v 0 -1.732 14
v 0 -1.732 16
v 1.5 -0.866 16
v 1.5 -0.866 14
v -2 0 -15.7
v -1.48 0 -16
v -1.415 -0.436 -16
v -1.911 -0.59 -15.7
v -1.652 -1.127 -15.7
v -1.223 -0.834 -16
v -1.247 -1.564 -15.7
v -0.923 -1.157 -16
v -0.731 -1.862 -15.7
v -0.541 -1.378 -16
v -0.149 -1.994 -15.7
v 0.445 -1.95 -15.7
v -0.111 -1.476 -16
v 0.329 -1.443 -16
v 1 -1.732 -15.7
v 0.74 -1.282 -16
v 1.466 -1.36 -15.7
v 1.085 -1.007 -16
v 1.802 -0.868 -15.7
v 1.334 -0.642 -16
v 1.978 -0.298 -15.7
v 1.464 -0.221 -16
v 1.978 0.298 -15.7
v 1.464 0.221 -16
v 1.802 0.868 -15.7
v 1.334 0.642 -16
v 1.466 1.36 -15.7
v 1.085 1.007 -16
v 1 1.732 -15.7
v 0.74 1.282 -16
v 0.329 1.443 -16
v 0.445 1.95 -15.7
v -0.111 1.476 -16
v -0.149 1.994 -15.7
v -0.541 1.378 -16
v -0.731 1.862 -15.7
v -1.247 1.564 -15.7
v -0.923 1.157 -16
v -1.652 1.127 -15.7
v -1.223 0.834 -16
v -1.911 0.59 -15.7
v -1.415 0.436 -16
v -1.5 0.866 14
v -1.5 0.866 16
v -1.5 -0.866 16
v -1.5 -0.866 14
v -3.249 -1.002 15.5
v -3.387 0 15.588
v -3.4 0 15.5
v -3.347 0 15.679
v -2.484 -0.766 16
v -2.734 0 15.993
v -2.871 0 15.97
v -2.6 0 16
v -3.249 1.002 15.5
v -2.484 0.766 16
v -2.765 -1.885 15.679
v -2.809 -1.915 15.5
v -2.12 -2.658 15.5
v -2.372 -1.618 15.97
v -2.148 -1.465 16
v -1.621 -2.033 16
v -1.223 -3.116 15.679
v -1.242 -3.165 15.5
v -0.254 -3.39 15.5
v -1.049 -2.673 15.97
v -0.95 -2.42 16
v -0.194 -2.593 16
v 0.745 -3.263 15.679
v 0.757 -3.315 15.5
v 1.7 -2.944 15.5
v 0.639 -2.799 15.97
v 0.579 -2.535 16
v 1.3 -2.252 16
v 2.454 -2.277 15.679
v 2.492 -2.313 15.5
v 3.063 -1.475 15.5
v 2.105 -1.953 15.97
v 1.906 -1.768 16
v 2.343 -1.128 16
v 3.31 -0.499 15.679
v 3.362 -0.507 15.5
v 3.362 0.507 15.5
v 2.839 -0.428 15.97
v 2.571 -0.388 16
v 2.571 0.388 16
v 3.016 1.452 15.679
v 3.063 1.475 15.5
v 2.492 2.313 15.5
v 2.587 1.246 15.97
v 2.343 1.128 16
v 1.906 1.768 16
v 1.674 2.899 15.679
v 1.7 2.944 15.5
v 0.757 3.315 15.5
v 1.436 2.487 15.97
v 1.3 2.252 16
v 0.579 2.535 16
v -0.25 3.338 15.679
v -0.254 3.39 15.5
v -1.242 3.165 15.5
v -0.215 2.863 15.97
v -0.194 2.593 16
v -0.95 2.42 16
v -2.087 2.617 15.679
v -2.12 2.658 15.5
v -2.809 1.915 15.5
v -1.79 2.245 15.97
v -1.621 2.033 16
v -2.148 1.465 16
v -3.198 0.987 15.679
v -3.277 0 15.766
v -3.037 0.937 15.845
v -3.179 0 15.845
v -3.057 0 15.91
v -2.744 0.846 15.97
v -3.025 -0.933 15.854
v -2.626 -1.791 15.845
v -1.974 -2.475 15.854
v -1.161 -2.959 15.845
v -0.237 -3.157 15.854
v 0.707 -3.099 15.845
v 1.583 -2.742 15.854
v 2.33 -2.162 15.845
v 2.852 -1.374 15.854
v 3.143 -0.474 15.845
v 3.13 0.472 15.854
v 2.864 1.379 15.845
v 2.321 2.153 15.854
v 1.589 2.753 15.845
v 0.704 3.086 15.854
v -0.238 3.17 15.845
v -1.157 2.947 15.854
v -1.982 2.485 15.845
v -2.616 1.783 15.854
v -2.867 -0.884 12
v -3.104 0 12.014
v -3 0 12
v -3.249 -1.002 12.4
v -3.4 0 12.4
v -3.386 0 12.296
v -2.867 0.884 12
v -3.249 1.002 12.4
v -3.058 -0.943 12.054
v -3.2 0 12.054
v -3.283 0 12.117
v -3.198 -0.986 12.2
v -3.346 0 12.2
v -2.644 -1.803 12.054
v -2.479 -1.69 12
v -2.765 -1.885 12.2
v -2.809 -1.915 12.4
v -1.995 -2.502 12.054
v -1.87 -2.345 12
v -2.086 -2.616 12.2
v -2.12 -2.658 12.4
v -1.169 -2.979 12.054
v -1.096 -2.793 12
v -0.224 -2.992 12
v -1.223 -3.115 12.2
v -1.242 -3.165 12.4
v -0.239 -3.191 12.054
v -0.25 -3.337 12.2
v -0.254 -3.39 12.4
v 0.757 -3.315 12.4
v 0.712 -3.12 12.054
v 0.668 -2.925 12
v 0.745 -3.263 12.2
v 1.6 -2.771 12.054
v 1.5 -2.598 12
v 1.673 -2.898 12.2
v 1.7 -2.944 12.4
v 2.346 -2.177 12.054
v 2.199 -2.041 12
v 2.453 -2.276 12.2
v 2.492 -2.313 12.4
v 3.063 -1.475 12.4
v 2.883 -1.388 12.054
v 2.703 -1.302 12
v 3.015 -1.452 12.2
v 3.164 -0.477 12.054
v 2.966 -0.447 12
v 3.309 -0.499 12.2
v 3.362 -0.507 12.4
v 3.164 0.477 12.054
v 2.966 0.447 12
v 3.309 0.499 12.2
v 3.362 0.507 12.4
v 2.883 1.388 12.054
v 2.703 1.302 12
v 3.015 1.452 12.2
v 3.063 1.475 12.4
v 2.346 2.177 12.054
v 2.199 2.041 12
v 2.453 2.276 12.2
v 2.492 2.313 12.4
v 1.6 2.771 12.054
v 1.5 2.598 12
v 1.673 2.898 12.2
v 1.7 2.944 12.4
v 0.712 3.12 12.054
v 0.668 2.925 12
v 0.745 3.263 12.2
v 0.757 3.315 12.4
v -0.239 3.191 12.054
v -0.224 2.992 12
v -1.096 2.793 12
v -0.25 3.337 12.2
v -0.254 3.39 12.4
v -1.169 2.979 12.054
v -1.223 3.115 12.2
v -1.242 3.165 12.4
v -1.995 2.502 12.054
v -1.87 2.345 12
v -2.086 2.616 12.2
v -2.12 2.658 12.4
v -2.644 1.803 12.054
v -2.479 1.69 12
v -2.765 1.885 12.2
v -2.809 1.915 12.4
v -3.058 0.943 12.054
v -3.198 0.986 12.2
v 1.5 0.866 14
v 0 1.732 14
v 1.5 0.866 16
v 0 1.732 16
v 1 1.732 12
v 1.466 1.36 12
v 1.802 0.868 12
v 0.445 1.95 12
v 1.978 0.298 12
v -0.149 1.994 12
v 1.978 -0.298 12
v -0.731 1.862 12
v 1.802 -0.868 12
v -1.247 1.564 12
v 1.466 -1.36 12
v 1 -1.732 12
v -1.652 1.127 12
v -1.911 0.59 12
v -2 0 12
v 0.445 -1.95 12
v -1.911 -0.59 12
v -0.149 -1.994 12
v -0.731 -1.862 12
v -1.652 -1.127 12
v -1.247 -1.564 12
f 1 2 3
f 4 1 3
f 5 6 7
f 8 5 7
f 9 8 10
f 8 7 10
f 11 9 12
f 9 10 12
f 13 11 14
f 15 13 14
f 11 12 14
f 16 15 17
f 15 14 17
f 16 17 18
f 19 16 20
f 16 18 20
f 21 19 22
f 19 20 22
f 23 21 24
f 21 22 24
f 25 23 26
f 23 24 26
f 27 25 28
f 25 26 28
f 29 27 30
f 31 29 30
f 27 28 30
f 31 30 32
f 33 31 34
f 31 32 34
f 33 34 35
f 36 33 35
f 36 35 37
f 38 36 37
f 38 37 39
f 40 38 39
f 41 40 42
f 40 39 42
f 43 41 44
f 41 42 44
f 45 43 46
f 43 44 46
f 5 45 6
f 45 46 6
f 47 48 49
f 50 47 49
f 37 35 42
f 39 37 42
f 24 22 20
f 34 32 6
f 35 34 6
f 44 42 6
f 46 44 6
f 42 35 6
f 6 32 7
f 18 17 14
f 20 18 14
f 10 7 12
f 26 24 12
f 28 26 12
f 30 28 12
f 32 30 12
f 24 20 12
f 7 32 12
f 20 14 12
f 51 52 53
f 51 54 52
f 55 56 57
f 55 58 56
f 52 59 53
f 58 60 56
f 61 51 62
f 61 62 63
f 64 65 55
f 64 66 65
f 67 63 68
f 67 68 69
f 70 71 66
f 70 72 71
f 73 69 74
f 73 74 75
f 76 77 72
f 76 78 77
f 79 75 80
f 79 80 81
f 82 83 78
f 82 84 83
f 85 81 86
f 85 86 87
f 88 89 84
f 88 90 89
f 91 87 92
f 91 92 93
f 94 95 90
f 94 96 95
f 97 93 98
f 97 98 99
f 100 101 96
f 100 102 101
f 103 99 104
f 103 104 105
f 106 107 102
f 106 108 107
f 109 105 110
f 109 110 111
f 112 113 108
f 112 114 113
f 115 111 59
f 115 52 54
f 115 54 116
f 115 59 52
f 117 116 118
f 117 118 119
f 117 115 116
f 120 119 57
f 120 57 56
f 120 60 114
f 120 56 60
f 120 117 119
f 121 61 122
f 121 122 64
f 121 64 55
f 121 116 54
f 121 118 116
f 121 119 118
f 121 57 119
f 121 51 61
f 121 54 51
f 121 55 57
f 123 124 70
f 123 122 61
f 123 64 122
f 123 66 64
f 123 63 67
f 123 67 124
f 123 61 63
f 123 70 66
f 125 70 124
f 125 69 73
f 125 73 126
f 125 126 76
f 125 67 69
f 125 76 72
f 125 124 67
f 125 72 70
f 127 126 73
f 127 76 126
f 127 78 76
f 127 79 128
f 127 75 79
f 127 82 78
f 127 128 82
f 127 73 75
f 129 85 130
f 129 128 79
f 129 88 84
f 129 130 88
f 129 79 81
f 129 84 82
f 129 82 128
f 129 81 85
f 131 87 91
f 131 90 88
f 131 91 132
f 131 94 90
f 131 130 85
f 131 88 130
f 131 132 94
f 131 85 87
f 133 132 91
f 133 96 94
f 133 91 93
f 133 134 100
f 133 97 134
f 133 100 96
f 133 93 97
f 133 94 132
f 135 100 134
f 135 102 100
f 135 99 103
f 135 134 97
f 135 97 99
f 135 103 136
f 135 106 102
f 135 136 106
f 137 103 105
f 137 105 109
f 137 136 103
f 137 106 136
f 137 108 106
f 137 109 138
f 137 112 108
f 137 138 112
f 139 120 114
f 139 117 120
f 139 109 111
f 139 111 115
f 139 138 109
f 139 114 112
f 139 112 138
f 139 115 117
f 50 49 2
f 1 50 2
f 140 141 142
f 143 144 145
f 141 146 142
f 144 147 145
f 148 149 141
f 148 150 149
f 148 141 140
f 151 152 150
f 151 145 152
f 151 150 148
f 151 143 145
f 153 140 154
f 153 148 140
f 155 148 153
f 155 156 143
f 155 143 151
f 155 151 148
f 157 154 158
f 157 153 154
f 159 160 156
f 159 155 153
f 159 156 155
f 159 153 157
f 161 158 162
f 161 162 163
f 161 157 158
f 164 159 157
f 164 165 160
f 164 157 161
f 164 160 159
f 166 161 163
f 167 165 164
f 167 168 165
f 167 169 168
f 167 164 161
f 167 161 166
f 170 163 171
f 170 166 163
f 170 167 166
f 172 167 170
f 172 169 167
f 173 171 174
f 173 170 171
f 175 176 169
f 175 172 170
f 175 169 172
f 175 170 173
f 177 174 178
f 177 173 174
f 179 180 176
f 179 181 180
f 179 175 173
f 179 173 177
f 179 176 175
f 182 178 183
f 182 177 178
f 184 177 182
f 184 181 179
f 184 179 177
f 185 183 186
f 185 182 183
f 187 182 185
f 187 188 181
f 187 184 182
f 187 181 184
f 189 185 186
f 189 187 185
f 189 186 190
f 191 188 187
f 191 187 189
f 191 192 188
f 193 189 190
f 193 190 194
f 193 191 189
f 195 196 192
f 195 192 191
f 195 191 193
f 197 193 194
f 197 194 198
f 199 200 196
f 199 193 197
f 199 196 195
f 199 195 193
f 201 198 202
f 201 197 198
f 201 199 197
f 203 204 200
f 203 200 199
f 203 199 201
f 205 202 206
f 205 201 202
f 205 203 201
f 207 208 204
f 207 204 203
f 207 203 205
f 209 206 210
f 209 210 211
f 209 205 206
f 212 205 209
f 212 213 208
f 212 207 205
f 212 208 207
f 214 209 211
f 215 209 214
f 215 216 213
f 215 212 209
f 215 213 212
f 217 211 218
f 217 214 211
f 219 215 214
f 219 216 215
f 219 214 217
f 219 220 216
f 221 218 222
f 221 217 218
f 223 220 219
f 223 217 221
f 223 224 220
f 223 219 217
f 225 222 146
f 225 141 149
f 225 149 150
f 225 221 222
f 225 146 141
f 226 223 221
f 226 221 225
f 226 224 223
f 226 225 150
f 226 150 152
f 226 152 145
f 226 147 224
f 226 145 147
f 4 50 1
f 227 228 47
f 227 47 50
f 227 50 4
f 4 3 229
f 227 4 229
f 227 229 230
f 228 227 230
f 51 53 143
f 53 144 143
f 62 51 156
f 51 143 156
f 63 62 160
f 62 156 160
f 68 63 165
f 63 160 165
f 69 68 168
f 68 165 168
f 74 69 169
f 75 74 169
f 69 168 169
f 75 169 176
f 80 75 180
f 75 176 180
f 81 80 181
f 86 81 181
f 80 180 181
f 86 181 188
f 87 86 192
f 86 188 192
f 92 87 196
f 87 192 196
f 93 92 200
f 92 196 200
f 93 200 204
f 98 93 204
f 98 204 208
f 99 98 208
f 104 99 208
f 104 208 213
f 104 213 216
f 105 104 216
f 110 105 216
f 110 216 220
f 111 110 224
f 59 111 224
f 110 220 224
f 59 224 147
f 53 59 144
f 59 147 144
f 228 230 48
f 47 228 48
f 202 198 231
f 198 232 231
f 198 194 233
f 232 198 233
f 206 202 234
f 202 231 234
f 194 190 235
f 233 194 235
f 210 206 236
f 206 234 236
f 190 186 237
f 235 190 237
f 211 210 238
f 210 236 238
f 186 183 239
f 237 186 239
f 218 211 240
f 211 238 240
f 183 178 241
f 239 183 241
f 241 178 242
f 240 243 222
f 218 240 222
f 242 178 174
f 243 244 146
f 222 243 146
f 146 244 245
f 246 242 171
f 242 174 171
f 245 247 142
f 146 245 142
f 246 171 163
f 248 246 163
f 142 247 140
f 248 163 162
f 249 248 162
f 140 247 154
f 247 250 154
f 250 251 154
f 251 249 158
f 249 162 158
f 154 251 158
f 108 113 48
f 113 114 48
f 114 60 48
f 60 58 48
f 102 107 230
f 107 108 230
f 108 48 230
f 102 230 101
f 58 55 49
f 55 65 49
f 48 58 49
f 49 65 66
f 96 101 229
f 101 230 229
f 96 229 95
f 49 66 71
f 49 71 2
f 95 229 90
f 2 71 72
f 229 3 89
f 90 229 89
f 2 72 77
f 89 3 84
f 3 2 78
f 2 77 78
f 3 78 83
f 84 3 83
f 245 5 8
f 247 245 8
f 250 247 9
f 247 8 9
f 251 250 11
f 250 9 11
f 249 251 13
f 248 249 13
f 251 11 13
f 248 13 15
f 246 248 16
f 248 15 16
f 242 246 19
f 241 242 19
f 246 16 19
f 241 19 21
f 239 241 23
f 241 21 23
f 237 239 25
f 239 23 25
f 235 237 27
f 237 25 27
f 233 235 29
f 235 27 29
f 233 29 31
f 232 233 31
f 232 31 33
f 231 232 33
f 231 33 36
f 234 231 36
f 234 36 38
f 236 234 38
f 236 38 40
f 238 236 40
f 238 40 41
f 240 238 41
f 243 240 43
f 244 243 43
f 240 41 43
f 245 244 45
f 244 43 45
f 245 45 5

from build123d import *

# Parameters (mm, degrees)
CHAMFER_1_SIZE      = 0.3
CHAMFER_1_SIZE2     = 0.519615242
FILLET_1_R          = 0.4
FILLET_2_SIZE       = 0.5
FILLET_2_SIZE_2     = 0.8
CUT_EXTRUDE_1_DEPTH = 2


with BuildPart() as part:
    # 草图2 → 旋转1 (revolve)
    with BuildSketch(Plane(origin=(0, 0, 0), x_dir=(0, 0, -1), z_dir=(1, 0, 0)), mode=Mode.PRIVATE) as revolve_1_sk:
        Polygon((-16, 0), (-16, 3.4), (-12, 3.4), (-12, 2), (16, 2), (16, 0), align=None)
    revolve(revolve_1_sk.sketch.rotate(Axis((0, 0, -16), (0, 0, 1)), 90), axis=Axis((0, 0, -16), (0, 0, 1)))

    # 倒角1
    chamfer_1_edges = [part.edges().sort_by_distance(p)[0] for p in [
        (2, 0, -16),
    ]]
    chamfer_1_side = [part.faces().sort_by_distance(p)[0] for p in [
        (2, 0, -2),
    ]]
    chamfer(chamfer_1_edges, length=CHAMFER_1_SIZE, length2=CHAMFER_1_SIZE2, reference=chamfer_1_side[0])

    # 圆角1
    fillet_1_edges = [part.edges().sort_by_distance(p)[0] for p in [
        (3.4, 0, 12),
    ]]
    fillet(fillet_1_edges, radius=FILLET_1_R)

    # 圆角2
    # an asymmetric fillet: 0.8, 0.5 mm, written as the material it takes off along each edge
    with BuildSketch(Plane(origin=(0, 0, 16), x_dir=(-1, 0, 0), z_dir=(0, 1, 0))) as fillet_2_piece_1:
        with BuildLine():
            Bezier((3.4, -FILLET_2_SIZE), (3.4, 0), (3.4 - FILLET_2_SIZE_2, 0), weights=[1, 0.707106781, 1])
            Line((3.4 - FILLET_2_SIZE_2, 0), (3.4, 0))
            Line((3.4, 0), (3.4, -FILLET_2_SIZE))
        make_face()
    revolve(axis=Axis((0, 0, 16), (0, 0, 1)), mode=Mode.SUBTRACT)

    # 草图3 → 切除-拉伸1 (cut)
    with BuildSketch(Plane.XY.offset(16)):
        Polygon((0, 1.732050808), (-1.5, 0.866025404), (-1.5, -0.866025404), (0, -1.732050808), (1.5, -0.866025404), (1.5, 0.866025404), align=None)
    extrude(amount=-CUT_EXTRUDE_1_DEPTH, mode=Mode.SUBTRACT)


solid = part.part
